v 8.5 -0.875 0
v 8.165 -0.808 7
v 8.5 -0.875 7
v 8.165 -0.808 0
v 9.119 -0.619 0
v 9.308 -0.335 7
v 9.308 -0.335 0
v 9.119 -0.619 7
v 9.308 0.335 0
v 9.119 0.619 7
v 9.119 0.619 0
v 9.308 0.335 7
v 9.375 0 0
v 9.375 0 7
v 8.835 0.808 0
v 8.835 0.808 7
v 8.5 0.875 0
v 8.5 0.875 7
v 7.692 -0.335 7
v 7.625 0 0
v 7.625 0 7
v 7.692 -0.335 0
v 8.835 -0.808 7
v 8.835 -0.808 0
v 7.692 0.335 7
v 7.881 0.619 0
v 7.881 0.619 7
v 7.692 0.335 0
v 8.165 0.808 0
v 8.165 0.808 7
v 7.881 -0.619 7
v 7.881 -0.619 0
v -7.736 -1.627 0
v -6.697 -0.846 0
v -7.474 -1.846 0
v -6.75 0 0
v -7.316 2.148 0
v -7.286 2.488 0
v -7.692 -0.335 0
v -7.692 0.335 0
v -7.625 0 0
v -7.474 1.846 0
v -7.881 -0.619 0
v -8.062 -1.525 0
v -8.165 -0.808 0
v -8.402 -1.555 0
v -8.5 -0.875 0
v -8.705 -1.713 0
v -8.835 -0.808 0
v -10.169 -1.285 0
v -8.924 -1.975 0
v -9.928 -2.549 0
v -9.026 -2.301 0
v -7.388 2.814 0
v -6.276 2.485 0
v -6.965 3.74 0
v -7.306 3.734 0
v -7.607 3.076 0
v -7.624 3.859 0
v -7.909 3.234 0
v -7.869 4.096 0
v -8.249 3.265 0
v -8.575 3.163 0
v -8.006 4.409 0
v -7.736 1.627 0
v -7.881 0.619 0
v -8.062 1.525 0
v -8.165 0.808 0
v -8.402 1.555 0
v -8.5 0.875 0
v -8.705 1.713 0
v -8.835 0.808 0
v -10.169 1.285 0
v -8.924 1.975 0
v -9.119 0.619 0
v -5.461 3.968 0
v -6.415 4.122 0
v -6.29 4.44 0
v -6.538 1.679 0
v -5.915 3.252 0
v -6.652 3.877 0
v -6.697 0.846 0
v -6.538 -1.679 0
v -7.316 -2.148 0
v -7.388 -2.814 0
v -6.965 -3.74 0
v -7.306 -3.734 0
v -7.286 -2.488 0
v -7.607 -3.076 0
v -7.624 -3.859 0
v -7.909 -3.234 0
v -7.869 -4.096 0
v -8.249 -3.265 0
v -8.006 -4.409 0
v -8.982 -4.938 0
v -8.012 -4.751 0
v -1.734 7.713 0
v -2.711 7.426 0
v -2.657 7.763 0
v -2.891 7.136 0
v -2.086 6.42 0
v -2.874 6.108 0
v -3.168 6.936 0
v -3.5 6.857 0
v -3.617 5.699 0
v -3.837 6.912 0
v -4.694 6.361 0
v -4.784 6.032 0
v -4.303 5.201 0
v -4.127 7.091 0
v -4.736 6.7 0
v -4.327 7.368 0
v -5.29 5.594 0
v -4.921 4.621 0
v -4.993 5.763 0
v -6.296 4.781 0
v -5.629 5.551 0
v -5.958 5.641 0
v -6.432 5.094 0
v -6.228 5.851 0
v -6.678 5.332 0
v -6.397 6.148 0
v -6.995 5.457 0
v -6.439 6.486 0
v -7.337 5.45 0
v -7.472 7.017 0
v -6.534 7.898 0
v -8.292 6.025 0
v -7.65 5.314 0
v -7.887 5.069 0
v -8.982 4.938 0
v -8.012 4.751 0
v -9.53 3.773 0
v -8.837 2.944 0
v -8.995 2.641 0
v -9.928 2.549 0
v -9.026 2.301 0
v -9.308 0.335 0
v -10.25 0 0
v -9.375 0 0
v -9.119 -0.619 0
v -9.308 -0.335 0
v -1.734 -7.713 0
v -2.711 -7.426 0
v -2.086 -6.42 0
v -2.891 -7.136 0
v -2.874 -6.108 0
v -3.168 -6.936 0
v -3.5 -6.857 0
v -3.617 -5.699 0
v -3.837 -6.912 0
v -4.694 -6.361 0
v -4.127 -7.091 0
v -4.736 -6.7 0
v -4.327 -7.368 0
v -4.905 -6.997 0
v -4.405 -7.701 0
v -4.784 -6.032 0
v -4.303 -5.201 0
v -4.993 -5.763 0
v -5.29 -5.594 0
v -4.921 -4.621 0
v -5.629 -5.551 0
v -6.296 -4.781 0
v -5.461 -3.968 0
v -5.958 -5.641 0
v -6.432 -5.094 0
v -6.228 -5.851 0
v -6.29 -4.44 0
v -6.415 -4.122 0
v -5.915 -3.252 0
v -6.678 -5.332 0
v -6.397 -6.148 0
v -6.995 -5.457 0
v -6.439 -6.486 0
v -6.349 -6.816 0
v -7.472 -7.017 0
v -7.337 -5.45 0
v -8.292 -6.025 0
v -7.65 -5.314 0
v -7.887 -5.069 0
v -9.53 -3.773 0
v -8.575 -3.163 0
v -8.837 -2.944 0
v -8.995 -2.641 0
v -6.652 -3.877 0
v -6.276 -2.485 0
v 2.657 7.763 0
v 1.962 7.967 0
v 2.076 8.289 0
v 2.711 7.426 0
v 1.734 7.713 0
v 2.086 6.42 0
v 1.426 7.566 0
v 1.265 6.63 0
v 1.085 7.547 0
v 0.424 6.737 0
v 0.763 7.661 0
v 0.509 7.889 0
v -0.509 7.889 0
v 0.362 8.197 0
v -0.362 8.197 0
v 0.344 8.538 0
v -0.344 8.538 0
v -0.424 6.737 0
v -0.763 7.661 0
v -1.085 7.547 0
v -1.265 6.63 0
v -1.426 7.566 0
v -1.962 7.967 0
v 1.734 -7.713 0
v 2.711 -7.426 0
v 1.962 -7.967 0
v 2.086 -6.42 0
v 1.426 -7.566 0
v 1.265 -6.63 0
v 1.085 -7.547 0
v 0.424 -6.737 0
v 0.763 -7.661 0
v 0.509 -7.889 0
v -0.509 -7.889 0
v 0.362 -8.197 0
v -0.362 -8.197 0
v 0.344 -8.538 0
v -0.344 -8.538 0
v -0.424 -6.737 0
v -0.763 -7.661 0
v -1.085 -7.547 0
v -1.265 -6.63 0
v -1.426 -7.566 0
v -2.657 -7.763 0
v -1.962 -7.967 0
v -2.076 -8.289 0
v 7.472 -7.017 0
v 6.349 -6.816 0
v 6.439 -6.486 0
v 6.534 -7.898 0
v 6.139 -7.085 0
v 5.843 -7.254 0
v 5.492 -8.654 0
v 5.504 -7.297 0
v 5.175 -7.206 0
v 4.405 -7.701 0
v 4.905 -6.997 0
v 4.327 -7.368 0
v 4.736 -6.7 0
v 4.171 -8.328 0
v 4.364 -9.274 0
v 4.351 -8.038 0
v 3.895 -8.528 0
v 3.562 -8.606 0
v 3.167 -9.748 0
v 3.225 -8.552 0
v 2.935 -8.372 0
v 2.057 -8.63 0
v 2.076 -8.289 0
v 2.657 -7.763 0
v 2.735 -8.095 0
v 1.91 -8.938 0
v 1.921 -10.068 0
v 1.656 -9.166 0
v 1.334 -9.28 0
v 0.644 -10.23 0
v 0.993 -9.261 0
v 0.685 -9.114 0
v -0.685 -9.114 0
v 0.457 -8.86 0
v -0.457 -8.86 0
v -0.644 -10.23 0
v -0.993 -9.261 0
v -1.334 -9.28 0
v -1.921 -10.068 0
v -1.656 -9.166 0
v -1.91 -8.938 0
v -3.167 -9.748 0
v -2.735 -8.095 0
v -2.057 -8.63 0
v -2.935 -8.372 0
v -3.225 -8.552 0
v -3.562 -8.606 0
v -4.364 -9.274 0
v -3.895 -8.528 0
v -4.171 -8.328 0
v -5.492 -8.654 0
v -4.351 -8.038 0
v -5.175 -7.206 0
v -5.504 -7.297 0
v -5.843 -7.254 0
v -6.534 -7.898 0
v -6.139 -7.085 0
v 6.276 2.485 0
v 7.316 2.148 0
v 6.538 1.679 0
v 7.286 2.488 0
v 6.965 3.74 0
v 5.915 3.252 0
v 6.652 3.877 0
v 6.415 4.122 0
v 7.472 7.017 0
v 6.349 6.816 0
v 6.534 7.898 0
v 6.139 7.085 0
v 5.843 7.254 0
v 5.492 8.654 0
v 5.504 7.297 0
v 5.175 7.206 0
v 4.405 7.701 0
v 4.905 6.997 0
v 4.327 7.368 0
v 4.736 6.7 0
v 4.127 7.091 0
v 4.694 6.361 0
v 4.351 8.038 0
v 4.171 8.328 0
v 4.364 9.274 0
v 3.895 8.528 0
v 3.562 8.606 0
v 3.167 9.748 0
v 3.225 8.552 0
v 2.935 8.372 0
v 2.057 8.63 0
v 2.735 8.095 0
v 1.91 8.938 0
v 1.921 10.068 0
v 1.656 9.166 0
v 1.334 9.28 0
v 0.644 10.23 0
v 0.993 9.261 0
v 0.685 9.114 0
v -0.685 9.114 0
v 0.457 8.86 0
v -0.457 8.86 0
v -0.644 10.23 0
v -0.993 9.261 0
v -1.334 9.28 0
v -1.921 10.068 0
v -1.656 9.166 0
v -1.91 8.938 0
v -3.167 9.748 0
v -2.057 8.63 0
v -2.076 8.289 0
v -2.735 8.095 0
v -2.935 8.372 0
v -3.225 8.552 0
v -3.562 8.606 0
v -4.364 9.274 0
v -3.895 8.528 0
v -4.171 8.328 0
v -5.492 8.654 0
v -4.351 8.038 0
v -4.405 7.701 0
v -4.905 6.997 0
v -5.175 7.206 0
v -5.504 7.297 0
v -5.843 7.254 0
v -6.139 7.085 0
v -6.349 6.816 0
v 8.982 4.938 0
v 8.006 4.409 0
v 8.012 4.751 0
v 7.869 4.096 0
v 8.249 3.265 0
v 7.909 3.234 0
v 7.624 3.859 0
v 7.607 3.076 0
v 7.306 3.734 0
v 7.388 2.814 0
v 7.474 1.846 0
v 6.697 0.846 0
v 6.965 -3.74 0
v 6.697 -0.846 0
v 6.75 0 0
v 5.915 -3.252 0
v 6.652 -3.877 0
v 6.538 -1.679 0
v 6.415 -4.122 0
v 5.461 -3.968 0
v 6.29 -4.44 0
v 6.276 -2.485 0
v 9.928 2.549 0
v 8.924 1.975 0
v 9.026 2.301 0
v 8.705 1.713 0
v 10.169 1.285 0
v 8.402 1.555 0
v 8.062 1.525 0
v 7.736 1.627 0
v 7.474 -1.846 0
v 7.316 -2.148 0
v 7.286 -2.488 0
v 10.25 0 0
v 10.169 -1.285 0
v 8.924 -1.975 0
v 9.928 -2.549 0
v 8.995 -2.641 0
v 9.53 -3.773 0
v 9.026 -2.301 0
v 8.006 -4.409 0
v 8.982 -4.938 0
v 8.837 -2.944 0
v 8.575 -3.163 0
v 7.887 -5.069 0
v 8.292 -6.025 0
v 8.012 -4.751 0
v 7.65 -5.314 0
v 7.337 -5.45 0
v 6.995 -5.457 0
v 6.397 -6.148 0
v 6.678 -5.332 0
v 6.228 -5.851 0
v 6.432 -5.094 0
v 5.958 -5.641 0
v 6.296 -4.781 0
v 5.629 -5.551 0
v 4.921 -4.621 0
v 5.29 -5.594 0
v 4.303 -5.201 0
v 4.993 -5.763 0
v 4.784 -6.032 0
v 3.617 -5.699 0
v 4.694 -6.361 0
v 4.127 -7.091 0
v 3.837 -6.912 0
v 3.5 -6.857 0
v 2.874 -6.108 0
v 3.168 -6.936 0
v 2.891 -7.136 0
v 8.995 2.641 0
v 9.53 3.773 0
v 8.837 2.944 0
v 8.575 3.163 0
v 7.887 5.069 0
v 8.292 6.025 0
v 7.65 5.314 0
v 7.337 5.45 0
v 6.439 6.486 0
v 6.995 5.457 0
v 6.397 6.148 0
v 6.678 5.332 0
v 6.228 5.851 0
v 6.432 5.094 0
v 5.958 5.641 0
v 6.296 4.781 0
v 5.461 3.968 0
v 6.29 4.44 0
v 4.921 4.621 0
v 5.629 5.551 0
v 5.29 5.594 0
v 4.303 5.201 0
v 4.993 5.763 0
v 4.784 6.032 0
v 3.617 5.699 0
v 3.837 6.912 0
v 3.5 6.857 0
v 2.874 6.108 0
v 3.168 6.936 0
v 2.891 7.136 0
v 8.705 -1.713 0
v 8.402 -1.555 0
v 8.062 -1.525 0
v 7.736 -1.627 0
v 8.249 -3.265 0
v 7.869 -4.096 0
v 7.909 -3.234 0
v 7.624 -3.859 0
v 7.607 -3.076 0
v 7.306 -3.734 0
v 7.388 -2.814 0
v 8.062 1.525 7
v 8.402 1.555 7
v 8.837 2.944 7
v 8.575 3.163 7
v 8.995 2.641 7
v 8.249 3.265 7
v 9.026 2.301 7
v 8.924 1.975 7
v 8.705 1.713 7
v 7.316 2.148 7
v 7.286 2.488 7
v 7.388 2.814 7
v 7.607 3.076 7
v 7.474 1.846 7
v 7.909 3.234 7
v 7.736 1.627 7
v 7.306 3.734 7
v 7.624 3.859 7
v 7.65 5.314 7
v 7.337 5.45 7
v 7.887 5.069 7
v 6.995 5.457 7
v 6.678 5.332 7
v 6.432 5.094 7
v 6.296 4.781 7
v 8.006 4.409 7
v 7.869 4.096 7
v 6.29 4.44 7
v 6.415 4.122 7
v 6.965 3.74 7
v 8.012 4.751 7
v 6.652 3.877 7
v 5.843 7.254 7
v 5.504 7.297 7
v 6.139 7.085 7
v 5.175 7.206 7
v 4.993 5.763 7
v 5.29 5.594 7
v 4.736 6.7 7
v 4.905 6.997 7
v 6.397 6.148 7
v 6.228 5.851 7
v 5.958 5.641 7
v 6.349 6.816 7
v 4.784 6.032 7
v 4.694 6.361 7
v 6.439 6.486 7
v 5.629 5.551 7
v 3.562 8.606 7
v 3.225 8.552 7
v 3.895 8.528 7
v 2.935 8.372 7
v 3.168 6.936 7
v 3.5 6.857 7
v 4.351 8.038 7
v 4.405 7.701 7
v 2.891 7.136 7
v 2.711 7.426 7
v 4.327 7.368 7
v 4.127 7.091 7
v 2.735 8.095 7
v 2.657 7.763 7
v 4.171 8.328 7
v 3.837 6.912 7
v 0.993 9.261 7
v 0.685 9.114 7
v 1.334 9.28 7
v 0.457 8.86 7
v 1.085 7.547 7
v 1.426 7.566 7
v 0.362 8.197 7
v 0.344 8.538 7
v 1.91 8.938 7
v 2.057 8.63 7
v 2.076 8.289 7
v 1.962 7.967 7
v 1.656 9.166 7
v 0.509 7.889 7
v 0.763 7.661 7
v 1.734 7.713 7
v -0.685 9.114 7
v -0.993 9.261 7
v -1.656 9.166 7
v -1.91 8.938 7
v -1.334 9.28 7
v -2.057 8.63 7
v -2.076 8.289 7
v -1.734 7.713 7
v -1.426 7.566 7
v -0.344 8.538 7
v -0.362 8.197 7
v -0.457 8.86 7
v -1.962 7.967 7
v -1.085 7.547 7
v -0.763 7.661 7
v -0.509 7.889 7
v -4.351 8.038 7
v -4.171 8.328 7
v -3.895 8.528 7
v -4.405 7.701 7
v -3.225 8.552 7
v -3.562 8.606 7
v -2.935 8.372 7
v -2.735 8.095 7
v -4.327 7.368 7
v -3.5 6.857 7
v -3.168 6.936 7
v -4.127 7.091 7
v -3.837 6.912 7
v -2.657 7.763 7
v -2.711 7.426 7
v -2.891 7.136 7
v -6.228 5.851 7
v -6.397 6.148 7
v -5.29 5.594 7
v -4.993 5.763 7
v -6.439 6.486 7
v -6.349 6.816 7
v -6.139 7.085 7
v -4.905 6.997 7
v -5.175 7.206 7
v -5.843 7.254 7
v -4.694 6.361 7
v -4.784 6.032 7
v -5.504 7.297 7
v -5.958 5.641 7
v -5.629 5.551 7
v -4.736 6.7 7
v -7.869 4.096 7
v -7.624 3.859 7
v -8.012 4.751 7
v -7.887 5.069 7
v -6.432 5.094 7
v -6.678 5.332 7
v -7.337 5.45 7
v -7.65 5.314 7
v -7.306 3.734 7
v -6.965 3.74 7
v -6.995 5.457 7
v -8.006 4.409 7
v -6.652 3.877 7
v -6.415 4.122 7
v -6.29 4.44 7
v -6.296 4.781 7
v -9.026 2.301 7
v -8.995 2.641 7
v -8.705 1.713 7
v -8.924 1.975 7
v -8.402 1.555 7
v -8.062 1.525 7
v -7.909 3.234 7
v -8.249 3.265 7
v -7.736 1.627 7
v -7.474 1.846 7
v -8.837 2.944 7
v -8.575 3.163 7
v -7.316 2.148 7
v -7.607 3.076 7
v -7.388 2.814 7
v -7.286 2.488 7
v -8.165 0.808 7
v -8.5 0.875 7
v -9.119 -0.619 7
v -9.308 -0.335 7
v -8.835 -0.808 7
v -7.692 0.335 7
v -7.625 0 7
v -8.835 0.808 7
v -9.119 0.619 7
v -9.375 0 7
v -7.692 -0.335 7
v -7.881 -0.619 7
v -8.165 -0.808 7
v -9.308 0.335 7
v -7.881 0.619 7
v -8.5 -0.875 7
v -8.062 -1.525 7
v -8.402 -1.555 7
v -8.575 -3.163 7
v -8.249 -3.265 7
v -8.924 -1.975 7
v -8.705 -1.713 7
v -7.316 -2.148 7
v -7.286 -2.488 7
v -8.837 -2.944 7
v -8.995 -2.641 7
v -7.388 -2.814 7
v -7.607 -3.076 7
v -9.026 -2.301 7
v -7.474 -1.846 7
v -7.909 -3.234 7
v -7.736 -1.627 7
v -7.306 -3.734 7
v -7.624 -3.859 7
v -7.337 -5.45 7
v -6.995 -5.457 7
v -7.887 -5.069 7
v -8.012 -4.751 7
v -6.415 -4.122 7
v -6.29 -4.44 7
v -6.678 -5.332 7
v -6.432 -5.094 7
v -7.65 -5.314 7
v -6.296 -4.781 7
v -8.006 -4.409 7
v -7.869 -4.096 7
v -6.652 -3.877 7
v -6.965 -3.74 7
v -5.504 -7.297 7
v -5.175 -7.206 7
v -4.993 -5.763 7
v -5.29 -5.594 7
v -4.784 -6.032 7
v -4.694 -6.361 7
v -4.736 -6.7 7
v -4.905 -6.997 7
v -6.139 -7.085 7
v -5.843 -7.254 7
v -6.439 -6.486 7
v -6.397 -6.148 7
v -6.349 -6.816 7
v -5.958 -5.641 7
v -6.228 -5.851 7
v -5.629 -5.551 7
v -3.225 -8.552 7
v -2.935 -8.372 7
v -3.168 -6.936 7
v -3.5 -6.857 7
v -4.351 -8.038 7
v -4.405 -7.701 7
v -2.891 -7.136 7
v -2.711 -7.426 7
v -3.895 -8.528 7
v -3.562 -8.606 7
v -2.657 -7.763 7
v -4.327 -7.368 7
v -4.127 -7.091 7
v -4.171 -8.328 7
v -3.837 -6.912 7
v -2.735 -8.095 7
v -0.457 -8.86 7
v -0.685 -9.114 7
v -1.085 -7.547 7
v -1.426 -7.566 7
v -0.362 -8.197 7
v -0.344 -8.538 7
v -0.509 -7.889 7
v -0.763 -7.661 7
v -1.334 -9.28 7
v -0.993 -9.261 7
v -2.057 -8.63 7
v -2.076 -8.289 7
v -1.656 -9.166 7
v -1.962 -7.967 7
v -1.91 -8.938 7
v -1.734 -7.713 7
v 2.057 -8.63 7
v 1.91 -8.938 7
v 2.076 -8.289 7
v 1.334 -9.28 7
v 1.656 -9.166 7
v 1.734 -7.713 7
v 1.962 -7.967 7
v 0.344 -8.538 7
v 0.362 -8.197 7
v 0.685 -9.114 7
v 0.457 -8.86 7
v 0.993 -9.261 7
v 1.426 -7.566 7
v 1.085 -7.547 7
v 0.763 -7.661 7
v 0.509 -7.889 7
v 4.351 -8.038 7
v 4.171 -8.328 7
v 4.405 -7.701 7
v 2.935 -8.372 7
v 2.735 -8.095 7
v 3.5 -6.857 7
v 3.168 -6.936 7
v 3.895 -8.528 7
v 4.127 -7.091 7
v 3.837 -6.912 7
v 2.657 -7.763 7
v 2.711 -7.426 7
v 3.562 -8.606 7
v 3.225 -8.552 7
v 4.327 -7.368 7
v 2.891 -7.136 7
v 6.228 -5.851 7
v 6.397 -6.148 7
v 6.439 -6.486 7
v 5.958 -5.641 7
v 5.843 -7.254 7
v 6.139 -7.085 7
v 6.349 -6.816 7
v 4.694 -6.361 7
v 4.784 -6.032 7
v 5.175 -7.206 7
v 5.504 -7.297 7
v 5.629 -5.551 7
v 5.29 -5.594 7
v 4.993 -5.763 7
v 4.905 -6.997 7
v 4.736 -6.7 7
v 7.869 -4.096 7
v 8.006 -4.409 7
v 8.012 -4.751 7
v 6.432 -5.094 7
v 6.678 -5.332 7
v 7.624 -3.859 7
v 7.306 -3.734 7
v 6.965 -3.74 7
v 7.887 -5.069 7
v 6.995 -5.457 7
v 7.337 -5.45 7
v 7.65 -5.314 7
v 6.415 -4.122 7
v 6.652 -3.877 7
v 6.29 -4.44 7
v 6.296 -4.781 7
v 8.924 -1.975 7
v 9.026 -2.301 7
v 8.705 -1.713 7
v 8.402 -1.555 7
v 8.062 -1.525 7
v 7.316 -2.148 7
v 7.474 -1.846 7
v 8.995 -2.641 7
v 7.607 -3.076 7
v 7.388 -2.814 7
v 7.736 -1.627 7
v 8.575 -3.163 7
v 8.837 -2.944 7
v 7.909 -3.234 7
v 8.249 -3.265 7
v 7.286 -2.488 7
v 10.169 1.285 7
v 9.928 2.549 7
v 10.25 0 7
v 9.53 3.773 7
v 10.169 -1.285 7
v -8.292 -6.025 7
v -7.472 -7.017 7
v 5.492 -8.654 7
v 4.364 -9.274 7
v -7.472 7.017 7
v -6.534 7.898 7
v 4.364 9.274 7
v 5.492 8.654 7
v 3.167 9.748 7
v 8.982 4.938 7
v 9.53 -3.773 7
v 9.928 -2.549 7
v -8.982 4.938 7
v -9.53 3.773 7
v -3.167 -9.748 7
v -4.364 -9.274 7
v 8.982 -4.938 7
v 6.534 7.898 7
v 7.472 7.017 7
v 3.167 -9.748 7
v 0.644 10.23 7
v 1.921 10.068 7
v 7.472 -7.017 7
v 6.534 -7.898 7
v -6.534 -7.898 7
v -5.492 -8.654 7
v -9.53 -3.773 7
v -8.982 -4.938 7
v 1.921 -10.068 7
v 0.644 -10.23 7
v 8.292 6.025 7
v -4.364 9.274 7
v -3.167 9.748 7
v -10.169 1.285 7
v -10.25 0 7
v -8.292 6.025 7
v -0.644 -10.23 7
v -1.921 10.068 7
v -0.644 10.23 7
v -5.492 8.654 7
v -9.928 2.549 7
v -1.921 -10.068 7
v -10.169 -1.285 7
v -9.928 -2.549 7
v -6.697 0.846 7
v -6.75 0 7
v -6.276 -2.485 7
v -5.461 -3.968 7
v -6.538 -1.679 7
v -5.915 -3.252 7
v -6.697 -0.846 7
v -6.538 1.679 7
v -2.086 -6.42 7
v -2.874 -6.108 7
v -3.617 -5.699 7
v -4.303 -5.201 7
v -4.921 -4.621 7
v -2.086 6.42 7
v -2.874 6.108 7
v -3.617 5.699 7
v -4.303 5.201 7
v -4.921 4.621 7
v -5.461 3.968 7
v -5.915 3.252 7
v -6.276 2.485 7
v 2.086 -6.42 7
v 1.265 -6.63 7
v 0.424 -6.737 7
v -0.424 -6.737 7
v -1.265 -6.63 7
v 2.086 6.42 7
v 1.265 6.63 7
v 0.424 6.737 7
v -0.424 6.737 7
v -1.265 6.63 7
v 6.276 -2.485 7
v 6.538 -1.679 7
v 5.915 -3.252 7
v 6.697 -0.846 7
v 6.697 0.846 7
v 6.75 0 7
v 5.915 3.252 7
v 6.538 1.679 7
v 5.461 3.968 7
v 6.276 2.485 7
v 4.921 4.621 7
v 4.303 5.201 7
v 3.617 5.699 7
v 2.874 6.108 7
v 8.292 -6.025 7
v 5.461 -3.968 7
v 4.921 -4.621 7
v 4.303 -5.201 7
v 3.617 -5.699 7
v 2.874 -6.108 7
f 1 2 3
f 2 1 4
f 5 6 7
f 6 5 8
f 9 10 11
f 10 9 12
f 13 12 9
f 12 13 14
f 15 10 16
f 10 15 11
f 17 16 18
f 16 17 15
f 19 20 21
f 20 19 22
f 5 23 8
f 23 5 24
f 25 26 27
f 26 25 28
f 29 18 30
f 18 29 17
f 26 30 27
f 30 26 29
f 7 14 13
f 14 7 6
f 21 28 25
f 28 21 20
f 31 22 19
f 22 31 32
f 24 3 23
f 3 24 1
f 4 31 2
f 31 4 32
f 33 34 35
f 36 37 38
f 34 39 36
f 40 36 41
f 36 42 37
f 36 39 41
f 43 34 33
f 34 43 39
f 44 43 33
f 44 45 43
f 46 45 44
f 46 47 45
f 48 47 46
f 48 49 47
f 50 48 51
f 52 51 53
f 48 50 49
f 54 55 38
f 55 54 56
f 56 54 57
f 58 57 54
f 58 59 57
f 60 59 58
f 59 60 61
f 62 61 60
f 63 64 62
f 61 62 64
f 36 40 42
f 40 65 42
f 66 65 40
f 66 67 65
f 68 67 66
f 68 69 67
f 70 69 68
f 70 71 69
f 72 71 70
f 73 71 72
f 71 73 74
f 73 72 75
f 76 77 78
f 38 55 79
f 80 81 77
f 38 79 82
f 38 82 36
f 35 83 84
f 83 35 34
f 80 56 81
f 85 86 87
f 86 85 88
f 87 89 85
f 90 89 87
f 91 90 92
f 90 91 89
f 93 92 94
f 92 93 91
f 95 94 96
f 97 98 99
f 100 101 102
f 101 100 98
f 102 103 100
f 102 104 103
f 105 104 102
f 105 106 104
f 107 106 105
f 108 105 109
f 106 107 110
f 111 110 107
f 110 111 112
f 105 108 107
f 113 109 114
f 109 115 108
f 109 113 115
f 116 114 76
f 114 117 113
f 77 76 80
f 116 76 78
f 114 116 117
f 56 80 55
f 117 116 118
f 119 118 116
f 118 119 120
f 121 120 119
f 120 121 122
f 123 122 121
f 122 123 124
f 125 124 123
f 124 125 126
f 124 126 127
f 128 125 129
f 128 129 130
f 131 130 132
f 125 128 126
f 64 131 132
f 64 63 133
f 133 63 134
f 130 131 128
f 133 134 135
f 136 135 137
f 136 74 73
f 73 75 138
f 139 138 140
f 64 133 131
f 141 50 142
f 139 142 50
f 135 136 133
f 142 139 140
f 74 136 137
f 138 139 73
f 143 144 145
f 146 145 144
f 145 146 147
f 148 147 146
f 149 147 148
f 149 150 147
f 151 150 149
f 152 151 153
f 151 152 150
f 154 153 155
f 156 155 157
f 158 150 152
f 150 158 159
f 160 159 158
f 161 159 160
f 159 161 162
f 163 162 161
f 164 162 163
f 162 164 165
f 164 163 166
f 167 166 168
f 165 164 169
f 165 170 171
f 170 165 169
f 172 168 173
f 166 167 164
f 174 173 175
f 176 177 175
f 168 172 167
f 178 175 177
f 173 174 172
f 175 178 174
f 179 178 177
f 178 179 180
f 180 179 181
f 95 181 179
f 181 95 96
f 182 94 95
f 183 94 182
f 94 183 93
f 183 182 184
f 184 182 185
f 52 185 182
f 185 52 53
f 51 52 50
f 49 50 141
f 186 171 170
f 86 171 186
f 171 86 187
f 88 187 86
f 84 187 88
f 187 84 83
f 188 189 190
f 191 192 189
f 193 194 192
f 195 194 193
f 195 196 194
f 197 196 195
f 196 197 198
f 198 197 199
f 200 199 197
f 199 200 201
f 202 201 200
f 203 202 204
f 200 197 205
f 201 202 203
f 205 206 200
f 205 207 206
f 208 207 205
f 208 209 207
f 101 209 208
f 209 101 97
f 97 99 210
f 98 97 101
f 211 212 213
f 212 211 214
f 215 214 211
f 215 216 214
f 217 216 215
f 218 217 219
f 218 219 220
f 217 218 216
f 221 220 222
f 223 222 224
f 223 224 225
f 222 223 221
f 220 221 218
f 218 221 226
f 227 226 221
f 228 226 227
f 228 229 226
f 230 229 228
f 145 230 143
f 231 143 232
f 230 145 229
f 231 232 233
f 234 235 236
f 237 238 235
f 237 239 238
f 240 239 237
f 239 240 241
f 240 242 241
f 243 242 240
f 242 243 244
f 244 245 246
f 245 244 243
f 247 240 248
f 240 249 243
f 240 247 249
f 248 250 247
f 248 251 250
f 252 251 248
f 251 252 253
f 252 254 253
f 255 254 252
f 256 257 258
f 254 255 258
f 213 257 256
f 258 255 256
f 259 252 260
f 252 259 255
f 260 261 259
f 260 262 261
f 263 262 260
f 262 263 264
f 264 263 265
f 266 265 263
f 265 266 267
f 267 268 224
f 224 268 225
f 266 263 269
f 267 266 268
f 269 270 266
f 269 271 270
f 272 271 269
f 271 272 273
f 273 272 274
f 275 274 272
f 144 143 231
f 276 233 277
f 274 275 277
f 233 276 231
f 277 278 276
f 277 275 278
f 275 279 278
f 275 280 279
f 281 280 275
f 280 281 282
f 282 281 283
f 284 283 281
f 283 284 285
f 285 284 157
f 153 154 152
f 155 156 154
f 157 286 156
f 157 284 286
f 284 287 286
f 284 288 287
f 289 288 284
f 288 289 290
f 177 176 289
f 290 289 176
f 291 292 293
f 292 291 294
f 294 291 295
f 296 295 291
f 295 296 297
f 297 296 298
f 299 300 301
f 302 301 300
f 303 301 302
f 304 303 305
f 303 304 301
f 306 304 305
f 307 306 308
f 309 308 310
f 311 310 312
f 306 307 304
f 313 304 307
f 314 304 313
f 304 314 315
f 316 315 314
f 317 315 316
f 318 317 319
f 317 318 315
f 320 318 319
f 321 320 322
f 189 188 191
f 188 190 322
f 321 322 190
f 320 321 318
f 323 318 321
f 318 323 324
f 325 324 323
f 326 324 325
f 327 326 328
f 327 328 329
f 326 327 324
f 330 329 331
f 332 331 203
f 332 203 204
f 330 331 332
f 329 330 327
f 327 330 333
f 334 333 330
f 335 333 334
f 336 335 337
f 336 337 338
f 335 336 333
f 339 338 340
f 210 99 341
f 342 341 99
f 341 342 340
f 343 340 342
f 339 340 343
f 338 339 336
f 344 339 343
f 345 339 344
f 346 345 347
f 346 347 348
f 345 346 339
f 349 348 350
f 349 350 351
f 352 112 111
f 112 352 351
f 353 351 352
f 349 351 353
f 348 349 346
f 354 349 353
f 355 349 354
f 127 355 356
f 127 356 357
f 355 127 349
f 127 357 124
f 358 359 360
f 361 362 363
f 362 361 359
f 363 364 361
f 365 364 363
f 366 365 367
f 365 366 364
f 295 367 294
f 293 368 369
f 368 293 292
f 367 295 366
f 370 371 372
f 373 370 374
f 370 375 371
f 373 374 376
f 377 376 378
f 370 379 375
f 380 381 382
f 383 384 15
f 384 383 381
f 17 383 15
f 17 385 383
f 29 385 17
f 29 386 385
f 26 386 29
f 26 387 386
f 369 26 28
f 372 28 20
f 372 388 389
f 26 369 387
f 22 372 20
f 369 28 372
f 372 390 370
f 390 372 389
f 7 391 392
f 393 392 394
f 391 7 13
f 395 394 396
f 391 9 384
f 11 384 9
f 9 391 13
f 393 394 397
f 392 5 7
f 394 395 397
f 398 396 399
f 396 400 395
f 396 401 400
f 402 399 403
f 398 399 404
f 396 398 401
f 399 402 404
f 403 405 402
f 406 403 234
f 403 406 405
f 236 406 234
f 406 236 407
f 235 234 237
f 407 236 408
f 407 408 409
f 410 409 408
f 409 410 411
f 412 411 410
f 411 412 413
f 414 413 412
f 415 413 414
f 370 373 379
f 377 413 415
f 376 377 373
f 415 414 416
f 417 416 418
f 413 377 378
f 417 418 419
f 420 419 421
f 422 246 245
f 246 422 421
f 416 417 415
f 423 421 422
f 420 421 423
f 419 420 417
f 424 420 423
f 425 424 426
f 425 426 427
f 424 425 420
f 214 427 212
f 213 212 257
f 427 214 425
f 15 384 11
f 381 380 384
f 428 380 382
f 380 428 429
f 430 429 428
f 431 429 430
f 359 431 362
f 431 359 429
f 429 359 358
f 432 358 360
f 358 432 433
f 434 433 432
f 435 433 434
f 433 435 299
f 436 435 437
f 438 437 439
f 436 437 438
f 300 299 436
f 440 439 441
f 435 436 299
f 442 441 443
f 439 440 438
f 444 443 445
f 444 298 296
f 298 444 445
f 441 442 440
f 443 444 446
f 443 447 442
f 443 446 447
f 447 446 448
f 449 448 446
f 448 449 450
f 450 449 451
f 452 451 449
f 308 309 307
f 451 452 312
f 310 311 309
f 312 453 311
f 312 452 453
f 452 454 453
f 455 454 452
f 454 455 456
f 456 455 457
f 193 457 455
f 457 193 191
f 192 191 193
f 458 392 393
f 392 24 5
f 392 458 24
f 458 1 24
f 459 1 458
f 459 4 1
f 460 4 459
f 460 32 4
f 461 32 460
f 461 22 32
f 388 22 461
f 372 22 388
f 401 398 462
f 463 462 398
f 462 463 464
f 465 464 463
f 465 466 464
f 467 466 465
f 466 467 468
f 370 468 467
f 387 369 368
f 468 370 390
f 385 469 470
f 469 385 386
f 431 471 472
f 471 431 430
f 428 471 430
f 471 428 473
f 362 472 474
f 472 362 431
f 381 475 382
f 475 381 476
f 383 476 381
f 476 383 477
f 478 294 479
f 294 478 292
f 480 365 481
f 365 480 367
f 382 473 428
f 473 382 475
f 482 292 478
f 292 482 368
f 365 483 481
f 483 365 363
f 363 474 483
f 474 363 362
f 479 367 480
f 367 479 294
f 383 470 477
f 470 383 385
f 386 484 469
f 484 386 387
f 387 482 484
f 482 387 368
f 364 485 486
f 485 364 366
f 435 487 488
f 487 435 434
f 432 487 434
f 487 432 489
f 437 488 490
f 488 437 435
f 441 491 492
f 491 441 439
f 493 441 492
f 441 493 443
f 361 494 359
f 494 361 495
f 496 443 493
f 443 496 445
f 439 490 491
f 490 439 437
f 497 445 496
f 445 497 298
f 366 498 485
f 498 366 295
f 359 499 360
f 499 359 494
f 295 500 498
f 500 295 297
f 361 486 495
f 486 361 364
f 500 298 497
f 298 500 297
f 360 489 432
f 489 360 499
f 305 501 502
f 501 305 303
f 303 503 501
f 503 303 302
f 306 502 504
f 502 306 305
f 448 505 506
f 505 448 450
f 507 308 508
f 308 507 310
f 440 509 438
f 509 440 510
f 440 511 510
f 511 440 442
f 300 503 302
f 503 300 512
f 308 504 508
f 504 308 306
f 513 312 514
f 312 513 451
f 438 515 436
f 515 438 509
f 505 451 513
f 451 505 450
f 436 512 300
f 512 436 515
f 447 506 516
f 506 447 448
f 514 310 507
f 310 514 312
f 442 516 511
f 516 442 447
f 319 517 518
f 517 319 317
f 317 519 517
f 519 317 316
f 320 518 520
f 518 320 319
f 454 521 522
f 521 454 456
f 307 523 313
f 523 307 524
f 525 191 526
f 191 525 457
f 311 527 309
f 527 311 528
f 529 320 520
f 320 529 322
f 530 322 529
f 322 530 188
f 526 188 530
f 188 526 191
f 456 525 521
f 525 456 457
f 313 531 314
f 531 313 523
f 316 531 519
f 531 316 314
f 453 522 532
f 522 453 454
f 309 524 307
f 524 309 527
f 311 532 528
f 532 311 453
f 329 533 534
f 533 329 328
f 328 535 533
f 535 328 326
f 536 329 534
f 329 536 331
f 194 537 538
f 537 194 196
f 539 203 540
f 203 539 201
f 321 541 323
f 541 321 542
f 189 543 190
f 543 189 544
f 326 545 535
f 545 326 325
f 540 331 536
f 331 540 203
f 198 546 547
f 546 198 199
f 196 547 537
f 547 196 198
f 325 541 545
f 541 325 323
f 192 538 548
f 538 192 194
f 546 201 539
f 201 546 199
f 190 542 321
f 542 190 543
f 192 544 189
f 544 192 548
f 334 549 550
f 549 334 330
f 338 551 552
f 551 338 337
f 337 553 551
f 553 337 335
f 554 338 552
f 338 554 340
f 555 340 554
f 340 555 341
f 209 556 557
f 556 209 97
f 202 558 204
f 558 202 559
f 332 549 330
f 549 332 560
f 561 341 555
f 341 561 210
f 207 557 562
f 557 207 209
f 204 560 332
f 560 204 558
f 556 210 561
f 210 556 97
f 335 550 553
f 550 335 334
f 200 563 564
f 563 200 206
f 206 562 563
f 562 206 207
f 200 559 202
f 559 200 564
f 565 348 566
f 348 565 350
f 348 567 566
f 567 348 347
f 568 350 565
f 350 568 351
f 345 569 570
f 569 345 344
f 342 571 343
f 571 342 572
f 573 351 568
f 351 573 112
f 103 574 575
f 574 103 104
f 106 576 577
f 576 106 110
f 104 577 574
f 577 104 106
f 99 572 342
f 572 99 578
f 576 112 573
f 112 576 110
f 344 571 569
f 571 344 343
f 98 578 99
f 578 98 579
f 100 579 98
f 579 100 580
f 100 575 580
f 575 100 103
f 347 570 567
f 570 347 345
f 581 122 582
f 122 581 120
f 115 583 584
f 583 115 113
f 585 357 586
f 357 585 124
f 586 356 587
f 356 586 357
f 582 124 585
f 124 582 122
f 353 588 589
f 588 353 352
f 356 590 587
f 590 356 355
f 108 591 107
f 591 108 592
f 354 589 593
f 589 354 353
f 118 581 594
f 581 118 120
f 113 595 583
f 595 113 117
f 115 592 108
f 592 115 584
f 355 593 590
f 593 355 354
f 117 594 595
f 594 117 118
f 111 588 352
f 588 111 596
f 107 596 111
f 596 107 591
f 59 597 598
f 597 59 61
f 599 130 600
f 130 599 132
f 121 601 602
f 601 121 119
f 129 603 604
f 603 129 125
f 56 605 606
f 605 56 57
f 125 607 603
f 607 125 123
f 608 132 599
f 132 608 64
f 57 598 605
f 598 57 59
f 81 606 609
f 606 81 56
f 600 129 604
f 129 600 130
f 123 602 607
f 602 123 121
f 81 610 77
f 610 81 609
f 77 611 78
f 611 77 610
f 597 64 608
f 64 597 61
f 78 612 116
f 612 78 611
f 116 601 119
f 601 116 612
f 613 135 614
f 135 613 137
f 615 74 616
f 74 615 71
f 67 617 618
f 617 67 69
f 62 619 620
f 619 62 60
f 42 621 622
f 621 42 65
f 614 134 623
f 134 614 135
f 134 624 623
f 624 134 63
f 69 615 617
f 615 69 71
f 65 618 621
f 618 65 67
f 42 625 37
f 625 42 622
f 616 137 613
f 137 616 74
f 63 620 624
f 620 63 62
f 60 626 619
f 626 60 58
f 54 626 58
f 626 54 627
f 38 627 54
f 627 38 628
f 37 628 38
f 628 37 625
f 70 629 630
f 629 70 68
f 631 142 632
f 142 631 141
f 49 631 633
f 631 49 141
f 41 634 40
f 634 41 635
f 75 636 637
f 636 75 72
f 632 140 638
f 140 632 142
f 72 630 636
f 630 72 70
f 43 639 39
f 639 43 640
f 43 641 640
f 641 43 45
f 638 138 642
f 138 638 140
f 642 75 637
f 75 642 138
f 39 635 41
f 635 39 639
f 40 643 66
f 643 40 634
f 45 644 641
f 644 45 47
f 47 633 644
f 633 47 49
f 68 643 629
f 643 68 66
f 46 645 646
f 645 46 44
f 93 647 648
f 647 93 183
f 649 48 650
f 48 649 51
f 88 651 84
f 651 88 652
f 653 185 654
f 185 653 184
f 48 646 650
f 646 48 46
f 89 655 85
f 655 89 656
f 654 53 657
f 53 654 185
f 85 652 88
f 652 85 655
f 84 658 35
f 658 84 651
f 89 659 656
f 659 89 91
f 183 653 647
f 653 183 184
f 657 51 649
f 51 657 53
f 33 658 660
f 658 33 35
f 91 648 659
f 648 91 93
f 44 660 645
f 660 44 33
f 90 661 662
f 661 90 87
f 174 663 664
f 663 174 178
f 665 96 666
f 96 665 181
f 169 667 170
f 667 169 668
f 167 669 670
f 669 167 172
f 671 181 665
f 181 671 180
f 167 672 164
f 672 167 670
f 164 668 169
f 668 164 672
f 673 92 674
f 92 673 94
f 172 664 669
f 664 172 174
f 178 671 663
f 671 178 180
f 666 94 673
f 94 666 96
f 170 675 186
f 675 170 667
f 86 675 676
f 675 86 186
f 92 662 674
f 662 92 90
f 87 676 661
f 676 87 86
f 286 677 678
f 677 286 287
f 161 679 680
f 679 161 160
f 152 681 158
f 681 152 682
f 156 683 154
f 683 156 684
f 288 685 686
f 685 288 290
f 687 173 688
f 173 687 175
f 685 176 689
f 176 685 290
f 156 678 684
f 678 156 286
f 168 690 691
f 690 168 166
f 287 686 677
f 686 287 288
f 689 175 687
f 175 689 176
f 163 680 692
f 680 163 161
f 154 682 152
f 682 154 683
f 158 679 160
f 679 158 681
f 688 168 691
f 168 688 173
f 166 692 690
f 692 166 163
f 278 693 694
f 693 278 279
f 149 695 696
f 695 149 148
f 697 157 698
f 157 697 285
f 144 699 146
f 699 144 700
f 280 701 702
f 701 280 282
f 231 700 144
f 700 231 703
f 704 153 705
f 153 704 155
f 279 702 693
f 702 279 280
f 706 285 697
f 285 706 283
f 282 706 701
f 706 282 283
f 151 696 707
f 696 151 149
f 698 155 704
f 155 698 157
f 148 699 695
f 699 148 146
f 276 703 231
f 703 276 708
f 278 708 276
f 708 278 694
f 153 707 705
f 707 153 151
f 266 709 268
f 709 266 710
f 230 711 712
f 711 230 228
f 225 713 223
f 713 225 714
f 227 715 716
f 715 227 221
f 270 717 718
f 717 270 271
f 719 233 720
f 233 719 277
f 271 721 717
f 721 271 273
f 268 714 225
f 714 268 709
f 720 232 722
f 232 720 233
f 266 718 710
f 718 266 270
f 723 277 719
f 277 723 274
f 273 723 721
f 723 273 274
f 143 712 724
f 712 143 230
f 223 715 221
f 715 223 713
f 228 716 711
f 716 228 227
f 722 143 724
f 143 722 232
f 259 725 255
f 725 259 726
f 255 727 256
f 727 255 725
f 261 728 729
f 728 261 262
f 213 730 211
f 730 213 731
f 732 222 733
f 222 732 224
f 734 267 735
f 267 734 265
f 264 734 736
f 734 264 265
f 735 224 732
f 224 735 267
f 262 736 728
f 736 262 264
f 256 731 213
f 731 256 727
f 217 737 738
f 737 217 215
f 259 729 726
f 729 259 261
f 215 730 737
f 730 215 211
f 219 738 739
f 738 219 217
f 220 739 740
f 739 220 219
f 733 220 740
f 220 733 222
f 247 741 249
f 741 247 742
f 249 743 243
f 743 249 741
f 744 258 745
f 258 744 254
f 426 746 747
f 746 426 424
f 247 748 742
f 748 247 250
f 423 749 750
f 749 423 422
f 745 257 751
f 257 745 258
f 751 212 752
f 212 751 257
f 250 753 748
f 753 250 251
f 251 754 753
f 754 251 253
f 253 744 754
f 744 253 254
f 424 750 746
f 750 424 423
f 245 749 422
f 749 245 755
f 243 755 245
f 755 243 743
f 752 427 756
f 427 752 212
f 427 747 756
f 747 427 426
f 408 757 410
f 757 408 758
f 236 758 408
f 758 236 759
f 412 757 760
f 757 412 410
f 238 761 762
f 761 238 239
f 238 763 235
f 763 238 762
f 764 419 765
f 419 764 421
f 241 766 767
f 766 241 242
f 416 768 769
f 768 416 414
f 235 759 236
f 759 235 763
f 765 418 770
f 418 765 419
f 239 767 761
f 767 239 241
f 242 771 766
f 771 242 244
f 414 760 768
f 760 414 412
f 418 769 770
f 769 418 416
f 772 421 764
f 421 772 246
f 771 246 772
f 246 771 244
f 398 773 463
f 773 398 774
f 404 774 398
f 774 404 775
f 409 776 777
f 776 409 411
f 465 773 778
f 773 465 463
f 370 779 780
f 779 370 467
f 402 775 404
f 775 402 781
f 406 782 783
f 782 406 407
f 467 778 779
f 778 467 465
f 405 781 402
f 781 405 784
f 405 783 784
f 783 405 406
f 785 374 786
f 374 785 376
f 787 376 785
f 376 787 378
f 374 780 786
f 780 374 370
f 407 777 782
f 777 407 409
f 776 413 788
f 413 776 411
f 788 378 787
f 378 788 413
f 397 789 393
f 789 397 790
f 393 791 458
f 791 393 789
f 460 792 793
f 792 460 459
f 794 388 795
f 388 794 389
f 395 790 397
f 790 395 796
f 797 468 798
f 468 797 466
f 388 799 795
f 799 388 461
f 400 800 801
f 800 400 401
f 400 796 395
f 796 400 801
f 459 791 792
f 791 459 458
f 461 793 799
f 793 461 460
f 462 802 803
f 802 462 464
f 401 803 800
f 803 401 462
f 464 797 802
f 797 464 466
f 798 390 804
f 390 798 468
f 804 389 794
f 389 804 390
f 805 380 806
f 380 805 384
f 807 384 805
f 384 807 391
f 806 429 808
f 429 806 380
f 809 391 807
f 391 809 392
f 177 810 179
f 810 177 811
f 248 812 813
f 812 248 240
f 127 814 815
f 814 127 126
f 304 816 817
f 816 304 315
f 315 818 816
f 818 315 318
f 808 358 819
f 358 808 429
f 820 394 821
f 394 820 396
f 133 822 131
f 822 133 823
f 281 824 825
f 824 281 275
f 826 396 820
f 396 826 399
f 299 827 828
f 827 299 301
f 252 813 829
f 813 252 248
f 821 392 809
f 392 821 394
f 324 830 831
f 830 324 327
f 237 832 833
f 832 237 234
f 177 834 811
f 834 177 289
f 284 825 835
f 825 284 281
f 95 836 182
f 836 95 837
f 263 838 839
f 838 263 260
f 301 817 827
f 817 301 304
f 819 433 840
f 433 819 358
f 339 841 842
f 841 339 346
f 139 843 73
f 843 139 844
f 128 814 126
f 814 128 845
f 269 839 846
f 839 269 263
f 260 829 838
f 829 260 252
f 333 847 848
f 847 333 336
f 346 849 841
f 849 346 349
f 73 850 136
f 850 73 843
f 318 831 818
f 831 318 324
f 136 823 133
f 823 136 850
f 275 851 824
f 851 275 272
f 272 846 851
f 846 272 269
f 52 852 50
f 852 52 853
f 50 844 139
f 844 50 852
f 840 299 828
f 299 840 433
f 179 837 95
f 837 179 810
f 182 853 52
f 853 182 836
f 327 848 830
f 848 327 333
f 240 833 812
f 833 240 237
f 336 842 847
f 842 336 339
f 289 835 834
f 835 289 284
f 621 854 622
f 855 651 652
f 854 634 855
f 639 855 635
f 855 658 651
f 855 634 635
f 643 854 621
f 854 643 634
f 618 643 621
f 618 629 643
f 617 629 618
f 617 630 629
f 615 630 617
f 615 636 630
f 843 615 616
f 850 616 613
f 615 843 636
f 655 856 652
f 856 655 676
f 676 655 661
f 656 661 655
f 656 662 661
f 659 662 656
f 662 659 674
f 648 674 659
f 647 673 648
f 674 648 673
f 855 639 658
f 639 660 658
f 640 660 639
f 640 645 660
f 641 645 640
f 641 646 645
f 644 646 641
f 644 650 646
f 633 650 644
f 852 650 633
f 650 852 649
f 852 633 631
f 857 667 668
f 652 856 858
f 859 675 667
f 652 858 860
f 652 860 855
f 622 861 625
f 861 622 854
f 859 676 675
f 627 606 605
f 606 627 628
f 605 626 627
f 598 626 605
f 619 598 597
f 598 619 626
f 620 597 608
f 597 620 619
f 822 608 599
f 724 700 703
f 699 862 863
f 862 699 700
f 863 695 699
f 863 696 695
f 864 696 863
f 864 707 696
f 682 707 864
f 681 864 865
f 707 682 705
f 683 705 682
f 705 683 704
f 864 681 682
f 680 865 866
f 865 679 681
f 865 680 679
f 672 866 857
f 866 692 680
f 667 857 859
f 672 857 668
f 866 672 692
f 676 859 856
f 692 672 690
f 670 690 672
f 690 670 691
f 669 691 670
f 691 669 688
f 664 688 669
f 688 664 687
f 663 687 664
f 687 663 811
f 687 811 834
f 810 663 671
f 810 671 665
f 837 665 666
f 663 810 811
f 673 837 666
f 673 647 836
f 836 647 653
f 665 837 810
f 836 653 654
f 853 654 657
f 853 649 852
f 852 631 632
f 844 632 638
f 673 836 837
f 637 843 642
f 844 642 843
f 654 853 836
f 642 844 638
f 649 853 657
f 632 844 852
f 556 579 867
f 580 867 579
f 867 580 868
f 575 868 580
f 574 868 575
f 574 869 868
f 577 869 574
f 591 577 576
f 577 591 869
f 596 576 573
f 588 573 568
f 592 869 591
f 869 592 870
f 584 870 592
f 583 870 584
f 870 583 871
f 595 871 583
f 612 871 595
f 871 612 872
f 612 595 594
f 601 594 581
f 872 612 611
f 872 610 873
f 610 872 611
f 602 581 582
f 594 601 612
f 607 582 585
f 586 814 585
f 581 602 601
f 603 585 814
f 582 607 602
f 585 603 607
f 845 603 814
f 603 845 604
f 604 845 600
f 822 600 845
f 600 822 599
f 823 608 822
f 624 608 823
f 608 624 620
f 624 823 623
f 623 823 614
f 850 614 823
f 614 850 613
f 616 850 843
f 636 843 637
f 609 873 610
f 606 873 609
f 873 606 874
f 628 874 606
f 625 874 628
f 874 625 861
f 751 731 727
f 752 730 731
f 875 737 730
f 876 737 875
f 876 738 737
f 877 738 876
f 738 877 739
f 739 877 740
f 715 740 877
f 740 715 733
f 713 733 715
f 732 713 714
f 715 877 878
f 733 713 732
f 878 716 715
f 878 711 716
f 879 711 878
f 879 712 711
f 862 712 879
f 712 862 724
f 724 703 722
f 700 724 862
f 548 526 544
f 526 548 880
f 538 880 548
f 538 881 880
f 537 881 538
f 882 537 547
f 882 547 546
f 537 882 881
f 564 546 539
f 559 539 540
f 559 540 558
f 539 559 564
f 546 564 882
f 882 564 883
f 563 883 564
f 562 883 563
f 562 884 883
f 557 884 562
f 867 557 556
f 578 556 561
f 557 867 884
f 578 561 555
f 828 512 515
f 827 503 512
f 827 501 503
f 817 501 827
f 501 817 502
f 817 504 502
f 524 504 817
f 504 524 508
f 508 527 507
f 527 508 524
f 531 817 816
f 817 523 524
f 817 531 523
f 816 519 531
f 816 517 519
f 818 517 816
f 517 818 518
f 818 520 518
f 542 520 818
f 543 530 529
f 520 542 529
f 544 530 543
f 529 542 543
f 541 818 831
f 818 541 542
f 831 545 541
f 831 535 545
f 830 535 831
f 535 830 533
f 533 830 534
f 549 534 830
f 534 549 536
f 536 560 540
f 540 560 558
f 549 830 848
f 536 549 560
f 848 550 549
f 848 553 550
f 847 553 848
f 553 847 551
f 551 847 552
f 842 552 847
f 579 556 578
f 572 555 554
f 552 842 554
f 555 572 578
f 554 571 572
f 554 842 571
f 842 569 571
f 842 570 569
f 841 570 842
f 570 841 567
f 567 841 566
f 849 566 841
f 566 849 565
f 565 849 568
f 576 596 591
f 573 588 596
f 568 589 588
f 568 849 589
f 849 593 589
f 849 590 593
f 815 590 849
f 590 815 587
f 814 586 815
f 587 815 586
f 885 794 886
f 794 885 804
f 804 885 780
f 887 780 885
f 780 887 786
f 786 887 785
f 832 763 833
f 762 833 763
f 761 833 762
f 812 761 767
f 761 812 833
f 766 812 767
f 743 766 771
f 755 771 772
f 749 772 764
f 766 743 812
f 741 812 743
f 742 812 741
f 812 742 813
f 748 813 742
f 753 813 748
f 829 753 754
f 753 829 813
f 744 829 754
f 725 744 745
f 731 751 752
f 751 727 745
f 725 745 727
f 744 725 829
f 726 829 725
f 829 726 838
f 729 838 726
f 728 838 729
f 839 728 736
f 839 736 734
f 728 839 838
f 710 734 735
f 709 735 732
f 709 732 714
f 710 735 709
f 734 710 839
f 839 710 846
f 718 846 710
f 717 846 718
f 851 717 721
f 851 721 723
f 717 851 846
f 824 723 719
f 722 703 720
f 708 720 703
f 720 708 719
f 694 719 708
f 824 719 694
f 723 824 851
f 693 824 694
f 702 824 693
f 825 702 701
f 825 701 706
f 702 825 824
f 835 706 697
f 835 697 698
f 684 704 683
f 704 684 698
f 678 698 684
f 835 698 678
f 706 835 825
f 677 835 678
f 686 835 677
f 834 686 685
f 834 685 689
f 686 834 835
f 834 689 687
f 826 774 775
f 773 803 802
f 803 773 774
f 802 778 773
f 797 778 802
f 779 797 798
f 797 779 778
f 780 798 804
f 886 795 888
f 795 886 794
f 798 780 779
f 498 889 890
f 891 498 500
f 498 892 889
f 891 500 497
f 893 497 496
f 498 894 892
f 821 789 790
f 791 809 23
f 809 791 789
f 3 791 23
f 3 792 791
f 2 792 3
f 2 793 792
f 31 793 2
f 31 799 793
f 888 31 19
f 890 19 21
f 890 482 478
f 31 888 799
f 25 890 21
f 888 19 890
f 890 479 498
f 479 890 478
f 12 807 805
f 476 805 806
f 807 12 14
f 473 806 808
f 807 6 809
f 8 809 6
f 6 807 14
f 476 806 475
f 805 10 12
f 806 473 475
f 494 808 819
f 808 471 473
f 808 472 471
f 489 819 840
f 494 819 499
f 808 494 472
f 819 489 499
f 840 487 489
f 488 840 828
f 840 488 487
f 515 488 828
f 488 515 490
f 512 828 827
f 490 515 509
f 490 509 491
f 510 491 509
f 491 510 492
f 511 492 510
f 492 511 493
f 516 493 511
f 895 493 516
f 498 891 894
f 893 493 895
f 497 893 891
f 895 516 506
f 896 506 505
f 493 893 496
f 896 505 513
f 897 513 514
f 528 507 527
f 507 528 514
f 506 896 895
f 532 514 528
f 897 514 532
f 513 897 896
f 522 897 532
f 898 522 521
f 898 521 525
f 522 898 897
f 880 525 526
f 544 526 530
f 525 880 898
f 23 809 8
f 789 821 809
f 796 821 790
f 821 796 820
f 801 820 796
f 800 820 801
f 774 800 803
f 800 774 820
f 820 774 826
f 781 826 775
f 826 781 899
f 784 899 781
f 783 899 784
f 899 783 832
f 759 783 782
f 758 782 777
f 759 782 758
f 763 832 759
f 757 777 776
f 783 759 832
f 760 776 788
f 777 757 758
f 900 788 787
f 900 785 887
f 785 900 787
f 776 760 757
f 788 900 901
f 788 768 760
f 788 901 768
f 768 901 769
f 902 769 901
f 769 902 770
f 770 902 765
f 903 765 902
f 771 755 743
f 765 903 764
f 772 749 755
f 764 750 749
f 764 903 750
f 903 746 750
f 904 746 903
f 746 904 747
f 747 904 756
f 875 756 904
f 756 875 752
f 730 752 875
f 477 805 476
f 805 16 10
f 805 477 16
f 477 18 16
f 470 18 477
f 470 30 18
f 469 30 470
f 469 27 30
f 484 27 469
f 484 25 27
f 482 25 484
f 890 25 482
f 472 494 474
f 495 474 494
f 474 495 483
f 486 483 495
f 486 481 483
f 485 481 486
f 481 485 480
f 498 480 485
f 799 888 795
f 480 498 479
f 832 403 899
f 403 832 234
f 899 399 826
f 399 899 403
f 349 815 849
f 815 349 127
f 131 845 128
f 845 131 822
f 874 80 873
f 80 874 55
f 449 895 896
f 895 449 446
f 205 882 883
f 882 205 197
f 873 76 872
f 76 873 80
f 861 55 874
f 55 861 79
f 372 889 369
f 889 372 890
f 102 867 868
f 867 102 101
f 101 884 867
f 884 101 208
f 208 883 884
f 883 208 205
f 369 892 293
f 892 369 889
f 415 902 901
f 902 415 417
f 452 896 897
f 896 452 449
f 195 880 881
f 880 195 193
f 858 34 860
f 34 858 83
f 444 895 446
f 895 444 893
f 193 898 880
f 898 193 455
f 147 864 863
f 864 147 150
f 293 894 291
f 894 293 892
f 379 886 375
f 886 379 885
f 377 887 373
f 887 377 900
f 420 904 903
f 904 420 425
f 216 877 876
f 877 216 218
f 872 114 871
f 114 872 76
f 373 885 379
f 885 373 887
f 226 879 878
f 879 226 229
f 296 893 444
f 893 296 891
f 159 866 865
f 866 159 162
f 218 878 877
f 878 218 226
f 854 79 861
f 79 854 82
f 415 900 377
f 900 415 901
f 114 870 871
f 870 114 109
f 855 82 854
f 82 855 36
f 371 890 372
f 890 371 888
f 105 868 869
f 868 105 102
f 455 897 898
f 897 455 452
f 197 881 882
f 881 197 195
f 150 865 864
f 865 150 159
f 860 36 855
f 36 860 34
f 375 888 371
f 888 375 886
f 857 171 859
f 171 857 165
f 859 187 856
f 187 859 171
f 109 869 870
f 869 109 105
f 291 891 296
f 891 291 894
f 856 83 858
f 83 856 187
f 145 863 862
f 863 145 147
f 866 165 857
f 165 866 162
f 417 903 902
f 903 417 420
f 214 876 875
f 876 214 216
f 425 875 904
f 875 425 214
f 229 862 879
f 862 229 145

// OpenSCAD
pin_ring_diameter=17;
pin_size=1.75;
pin_count=22;
height=7;

difference()
{
cylinder(r=(pin_ring_diameter/2)+(2*(pin_size/2)),h=height,$fn=50);

cylinder(r=(pin_ring_diameter/2)-(2*(pin_size/2)),h=height+1,$fn=50);

for (i=[0:(360/pin_count):360])
{
	rotate([0,0,i])
	translate([(pin_ring_diameter/2),0,0])
	cylinder(r=(pin_size/2),h=height+1, $fn=16);
}

}
